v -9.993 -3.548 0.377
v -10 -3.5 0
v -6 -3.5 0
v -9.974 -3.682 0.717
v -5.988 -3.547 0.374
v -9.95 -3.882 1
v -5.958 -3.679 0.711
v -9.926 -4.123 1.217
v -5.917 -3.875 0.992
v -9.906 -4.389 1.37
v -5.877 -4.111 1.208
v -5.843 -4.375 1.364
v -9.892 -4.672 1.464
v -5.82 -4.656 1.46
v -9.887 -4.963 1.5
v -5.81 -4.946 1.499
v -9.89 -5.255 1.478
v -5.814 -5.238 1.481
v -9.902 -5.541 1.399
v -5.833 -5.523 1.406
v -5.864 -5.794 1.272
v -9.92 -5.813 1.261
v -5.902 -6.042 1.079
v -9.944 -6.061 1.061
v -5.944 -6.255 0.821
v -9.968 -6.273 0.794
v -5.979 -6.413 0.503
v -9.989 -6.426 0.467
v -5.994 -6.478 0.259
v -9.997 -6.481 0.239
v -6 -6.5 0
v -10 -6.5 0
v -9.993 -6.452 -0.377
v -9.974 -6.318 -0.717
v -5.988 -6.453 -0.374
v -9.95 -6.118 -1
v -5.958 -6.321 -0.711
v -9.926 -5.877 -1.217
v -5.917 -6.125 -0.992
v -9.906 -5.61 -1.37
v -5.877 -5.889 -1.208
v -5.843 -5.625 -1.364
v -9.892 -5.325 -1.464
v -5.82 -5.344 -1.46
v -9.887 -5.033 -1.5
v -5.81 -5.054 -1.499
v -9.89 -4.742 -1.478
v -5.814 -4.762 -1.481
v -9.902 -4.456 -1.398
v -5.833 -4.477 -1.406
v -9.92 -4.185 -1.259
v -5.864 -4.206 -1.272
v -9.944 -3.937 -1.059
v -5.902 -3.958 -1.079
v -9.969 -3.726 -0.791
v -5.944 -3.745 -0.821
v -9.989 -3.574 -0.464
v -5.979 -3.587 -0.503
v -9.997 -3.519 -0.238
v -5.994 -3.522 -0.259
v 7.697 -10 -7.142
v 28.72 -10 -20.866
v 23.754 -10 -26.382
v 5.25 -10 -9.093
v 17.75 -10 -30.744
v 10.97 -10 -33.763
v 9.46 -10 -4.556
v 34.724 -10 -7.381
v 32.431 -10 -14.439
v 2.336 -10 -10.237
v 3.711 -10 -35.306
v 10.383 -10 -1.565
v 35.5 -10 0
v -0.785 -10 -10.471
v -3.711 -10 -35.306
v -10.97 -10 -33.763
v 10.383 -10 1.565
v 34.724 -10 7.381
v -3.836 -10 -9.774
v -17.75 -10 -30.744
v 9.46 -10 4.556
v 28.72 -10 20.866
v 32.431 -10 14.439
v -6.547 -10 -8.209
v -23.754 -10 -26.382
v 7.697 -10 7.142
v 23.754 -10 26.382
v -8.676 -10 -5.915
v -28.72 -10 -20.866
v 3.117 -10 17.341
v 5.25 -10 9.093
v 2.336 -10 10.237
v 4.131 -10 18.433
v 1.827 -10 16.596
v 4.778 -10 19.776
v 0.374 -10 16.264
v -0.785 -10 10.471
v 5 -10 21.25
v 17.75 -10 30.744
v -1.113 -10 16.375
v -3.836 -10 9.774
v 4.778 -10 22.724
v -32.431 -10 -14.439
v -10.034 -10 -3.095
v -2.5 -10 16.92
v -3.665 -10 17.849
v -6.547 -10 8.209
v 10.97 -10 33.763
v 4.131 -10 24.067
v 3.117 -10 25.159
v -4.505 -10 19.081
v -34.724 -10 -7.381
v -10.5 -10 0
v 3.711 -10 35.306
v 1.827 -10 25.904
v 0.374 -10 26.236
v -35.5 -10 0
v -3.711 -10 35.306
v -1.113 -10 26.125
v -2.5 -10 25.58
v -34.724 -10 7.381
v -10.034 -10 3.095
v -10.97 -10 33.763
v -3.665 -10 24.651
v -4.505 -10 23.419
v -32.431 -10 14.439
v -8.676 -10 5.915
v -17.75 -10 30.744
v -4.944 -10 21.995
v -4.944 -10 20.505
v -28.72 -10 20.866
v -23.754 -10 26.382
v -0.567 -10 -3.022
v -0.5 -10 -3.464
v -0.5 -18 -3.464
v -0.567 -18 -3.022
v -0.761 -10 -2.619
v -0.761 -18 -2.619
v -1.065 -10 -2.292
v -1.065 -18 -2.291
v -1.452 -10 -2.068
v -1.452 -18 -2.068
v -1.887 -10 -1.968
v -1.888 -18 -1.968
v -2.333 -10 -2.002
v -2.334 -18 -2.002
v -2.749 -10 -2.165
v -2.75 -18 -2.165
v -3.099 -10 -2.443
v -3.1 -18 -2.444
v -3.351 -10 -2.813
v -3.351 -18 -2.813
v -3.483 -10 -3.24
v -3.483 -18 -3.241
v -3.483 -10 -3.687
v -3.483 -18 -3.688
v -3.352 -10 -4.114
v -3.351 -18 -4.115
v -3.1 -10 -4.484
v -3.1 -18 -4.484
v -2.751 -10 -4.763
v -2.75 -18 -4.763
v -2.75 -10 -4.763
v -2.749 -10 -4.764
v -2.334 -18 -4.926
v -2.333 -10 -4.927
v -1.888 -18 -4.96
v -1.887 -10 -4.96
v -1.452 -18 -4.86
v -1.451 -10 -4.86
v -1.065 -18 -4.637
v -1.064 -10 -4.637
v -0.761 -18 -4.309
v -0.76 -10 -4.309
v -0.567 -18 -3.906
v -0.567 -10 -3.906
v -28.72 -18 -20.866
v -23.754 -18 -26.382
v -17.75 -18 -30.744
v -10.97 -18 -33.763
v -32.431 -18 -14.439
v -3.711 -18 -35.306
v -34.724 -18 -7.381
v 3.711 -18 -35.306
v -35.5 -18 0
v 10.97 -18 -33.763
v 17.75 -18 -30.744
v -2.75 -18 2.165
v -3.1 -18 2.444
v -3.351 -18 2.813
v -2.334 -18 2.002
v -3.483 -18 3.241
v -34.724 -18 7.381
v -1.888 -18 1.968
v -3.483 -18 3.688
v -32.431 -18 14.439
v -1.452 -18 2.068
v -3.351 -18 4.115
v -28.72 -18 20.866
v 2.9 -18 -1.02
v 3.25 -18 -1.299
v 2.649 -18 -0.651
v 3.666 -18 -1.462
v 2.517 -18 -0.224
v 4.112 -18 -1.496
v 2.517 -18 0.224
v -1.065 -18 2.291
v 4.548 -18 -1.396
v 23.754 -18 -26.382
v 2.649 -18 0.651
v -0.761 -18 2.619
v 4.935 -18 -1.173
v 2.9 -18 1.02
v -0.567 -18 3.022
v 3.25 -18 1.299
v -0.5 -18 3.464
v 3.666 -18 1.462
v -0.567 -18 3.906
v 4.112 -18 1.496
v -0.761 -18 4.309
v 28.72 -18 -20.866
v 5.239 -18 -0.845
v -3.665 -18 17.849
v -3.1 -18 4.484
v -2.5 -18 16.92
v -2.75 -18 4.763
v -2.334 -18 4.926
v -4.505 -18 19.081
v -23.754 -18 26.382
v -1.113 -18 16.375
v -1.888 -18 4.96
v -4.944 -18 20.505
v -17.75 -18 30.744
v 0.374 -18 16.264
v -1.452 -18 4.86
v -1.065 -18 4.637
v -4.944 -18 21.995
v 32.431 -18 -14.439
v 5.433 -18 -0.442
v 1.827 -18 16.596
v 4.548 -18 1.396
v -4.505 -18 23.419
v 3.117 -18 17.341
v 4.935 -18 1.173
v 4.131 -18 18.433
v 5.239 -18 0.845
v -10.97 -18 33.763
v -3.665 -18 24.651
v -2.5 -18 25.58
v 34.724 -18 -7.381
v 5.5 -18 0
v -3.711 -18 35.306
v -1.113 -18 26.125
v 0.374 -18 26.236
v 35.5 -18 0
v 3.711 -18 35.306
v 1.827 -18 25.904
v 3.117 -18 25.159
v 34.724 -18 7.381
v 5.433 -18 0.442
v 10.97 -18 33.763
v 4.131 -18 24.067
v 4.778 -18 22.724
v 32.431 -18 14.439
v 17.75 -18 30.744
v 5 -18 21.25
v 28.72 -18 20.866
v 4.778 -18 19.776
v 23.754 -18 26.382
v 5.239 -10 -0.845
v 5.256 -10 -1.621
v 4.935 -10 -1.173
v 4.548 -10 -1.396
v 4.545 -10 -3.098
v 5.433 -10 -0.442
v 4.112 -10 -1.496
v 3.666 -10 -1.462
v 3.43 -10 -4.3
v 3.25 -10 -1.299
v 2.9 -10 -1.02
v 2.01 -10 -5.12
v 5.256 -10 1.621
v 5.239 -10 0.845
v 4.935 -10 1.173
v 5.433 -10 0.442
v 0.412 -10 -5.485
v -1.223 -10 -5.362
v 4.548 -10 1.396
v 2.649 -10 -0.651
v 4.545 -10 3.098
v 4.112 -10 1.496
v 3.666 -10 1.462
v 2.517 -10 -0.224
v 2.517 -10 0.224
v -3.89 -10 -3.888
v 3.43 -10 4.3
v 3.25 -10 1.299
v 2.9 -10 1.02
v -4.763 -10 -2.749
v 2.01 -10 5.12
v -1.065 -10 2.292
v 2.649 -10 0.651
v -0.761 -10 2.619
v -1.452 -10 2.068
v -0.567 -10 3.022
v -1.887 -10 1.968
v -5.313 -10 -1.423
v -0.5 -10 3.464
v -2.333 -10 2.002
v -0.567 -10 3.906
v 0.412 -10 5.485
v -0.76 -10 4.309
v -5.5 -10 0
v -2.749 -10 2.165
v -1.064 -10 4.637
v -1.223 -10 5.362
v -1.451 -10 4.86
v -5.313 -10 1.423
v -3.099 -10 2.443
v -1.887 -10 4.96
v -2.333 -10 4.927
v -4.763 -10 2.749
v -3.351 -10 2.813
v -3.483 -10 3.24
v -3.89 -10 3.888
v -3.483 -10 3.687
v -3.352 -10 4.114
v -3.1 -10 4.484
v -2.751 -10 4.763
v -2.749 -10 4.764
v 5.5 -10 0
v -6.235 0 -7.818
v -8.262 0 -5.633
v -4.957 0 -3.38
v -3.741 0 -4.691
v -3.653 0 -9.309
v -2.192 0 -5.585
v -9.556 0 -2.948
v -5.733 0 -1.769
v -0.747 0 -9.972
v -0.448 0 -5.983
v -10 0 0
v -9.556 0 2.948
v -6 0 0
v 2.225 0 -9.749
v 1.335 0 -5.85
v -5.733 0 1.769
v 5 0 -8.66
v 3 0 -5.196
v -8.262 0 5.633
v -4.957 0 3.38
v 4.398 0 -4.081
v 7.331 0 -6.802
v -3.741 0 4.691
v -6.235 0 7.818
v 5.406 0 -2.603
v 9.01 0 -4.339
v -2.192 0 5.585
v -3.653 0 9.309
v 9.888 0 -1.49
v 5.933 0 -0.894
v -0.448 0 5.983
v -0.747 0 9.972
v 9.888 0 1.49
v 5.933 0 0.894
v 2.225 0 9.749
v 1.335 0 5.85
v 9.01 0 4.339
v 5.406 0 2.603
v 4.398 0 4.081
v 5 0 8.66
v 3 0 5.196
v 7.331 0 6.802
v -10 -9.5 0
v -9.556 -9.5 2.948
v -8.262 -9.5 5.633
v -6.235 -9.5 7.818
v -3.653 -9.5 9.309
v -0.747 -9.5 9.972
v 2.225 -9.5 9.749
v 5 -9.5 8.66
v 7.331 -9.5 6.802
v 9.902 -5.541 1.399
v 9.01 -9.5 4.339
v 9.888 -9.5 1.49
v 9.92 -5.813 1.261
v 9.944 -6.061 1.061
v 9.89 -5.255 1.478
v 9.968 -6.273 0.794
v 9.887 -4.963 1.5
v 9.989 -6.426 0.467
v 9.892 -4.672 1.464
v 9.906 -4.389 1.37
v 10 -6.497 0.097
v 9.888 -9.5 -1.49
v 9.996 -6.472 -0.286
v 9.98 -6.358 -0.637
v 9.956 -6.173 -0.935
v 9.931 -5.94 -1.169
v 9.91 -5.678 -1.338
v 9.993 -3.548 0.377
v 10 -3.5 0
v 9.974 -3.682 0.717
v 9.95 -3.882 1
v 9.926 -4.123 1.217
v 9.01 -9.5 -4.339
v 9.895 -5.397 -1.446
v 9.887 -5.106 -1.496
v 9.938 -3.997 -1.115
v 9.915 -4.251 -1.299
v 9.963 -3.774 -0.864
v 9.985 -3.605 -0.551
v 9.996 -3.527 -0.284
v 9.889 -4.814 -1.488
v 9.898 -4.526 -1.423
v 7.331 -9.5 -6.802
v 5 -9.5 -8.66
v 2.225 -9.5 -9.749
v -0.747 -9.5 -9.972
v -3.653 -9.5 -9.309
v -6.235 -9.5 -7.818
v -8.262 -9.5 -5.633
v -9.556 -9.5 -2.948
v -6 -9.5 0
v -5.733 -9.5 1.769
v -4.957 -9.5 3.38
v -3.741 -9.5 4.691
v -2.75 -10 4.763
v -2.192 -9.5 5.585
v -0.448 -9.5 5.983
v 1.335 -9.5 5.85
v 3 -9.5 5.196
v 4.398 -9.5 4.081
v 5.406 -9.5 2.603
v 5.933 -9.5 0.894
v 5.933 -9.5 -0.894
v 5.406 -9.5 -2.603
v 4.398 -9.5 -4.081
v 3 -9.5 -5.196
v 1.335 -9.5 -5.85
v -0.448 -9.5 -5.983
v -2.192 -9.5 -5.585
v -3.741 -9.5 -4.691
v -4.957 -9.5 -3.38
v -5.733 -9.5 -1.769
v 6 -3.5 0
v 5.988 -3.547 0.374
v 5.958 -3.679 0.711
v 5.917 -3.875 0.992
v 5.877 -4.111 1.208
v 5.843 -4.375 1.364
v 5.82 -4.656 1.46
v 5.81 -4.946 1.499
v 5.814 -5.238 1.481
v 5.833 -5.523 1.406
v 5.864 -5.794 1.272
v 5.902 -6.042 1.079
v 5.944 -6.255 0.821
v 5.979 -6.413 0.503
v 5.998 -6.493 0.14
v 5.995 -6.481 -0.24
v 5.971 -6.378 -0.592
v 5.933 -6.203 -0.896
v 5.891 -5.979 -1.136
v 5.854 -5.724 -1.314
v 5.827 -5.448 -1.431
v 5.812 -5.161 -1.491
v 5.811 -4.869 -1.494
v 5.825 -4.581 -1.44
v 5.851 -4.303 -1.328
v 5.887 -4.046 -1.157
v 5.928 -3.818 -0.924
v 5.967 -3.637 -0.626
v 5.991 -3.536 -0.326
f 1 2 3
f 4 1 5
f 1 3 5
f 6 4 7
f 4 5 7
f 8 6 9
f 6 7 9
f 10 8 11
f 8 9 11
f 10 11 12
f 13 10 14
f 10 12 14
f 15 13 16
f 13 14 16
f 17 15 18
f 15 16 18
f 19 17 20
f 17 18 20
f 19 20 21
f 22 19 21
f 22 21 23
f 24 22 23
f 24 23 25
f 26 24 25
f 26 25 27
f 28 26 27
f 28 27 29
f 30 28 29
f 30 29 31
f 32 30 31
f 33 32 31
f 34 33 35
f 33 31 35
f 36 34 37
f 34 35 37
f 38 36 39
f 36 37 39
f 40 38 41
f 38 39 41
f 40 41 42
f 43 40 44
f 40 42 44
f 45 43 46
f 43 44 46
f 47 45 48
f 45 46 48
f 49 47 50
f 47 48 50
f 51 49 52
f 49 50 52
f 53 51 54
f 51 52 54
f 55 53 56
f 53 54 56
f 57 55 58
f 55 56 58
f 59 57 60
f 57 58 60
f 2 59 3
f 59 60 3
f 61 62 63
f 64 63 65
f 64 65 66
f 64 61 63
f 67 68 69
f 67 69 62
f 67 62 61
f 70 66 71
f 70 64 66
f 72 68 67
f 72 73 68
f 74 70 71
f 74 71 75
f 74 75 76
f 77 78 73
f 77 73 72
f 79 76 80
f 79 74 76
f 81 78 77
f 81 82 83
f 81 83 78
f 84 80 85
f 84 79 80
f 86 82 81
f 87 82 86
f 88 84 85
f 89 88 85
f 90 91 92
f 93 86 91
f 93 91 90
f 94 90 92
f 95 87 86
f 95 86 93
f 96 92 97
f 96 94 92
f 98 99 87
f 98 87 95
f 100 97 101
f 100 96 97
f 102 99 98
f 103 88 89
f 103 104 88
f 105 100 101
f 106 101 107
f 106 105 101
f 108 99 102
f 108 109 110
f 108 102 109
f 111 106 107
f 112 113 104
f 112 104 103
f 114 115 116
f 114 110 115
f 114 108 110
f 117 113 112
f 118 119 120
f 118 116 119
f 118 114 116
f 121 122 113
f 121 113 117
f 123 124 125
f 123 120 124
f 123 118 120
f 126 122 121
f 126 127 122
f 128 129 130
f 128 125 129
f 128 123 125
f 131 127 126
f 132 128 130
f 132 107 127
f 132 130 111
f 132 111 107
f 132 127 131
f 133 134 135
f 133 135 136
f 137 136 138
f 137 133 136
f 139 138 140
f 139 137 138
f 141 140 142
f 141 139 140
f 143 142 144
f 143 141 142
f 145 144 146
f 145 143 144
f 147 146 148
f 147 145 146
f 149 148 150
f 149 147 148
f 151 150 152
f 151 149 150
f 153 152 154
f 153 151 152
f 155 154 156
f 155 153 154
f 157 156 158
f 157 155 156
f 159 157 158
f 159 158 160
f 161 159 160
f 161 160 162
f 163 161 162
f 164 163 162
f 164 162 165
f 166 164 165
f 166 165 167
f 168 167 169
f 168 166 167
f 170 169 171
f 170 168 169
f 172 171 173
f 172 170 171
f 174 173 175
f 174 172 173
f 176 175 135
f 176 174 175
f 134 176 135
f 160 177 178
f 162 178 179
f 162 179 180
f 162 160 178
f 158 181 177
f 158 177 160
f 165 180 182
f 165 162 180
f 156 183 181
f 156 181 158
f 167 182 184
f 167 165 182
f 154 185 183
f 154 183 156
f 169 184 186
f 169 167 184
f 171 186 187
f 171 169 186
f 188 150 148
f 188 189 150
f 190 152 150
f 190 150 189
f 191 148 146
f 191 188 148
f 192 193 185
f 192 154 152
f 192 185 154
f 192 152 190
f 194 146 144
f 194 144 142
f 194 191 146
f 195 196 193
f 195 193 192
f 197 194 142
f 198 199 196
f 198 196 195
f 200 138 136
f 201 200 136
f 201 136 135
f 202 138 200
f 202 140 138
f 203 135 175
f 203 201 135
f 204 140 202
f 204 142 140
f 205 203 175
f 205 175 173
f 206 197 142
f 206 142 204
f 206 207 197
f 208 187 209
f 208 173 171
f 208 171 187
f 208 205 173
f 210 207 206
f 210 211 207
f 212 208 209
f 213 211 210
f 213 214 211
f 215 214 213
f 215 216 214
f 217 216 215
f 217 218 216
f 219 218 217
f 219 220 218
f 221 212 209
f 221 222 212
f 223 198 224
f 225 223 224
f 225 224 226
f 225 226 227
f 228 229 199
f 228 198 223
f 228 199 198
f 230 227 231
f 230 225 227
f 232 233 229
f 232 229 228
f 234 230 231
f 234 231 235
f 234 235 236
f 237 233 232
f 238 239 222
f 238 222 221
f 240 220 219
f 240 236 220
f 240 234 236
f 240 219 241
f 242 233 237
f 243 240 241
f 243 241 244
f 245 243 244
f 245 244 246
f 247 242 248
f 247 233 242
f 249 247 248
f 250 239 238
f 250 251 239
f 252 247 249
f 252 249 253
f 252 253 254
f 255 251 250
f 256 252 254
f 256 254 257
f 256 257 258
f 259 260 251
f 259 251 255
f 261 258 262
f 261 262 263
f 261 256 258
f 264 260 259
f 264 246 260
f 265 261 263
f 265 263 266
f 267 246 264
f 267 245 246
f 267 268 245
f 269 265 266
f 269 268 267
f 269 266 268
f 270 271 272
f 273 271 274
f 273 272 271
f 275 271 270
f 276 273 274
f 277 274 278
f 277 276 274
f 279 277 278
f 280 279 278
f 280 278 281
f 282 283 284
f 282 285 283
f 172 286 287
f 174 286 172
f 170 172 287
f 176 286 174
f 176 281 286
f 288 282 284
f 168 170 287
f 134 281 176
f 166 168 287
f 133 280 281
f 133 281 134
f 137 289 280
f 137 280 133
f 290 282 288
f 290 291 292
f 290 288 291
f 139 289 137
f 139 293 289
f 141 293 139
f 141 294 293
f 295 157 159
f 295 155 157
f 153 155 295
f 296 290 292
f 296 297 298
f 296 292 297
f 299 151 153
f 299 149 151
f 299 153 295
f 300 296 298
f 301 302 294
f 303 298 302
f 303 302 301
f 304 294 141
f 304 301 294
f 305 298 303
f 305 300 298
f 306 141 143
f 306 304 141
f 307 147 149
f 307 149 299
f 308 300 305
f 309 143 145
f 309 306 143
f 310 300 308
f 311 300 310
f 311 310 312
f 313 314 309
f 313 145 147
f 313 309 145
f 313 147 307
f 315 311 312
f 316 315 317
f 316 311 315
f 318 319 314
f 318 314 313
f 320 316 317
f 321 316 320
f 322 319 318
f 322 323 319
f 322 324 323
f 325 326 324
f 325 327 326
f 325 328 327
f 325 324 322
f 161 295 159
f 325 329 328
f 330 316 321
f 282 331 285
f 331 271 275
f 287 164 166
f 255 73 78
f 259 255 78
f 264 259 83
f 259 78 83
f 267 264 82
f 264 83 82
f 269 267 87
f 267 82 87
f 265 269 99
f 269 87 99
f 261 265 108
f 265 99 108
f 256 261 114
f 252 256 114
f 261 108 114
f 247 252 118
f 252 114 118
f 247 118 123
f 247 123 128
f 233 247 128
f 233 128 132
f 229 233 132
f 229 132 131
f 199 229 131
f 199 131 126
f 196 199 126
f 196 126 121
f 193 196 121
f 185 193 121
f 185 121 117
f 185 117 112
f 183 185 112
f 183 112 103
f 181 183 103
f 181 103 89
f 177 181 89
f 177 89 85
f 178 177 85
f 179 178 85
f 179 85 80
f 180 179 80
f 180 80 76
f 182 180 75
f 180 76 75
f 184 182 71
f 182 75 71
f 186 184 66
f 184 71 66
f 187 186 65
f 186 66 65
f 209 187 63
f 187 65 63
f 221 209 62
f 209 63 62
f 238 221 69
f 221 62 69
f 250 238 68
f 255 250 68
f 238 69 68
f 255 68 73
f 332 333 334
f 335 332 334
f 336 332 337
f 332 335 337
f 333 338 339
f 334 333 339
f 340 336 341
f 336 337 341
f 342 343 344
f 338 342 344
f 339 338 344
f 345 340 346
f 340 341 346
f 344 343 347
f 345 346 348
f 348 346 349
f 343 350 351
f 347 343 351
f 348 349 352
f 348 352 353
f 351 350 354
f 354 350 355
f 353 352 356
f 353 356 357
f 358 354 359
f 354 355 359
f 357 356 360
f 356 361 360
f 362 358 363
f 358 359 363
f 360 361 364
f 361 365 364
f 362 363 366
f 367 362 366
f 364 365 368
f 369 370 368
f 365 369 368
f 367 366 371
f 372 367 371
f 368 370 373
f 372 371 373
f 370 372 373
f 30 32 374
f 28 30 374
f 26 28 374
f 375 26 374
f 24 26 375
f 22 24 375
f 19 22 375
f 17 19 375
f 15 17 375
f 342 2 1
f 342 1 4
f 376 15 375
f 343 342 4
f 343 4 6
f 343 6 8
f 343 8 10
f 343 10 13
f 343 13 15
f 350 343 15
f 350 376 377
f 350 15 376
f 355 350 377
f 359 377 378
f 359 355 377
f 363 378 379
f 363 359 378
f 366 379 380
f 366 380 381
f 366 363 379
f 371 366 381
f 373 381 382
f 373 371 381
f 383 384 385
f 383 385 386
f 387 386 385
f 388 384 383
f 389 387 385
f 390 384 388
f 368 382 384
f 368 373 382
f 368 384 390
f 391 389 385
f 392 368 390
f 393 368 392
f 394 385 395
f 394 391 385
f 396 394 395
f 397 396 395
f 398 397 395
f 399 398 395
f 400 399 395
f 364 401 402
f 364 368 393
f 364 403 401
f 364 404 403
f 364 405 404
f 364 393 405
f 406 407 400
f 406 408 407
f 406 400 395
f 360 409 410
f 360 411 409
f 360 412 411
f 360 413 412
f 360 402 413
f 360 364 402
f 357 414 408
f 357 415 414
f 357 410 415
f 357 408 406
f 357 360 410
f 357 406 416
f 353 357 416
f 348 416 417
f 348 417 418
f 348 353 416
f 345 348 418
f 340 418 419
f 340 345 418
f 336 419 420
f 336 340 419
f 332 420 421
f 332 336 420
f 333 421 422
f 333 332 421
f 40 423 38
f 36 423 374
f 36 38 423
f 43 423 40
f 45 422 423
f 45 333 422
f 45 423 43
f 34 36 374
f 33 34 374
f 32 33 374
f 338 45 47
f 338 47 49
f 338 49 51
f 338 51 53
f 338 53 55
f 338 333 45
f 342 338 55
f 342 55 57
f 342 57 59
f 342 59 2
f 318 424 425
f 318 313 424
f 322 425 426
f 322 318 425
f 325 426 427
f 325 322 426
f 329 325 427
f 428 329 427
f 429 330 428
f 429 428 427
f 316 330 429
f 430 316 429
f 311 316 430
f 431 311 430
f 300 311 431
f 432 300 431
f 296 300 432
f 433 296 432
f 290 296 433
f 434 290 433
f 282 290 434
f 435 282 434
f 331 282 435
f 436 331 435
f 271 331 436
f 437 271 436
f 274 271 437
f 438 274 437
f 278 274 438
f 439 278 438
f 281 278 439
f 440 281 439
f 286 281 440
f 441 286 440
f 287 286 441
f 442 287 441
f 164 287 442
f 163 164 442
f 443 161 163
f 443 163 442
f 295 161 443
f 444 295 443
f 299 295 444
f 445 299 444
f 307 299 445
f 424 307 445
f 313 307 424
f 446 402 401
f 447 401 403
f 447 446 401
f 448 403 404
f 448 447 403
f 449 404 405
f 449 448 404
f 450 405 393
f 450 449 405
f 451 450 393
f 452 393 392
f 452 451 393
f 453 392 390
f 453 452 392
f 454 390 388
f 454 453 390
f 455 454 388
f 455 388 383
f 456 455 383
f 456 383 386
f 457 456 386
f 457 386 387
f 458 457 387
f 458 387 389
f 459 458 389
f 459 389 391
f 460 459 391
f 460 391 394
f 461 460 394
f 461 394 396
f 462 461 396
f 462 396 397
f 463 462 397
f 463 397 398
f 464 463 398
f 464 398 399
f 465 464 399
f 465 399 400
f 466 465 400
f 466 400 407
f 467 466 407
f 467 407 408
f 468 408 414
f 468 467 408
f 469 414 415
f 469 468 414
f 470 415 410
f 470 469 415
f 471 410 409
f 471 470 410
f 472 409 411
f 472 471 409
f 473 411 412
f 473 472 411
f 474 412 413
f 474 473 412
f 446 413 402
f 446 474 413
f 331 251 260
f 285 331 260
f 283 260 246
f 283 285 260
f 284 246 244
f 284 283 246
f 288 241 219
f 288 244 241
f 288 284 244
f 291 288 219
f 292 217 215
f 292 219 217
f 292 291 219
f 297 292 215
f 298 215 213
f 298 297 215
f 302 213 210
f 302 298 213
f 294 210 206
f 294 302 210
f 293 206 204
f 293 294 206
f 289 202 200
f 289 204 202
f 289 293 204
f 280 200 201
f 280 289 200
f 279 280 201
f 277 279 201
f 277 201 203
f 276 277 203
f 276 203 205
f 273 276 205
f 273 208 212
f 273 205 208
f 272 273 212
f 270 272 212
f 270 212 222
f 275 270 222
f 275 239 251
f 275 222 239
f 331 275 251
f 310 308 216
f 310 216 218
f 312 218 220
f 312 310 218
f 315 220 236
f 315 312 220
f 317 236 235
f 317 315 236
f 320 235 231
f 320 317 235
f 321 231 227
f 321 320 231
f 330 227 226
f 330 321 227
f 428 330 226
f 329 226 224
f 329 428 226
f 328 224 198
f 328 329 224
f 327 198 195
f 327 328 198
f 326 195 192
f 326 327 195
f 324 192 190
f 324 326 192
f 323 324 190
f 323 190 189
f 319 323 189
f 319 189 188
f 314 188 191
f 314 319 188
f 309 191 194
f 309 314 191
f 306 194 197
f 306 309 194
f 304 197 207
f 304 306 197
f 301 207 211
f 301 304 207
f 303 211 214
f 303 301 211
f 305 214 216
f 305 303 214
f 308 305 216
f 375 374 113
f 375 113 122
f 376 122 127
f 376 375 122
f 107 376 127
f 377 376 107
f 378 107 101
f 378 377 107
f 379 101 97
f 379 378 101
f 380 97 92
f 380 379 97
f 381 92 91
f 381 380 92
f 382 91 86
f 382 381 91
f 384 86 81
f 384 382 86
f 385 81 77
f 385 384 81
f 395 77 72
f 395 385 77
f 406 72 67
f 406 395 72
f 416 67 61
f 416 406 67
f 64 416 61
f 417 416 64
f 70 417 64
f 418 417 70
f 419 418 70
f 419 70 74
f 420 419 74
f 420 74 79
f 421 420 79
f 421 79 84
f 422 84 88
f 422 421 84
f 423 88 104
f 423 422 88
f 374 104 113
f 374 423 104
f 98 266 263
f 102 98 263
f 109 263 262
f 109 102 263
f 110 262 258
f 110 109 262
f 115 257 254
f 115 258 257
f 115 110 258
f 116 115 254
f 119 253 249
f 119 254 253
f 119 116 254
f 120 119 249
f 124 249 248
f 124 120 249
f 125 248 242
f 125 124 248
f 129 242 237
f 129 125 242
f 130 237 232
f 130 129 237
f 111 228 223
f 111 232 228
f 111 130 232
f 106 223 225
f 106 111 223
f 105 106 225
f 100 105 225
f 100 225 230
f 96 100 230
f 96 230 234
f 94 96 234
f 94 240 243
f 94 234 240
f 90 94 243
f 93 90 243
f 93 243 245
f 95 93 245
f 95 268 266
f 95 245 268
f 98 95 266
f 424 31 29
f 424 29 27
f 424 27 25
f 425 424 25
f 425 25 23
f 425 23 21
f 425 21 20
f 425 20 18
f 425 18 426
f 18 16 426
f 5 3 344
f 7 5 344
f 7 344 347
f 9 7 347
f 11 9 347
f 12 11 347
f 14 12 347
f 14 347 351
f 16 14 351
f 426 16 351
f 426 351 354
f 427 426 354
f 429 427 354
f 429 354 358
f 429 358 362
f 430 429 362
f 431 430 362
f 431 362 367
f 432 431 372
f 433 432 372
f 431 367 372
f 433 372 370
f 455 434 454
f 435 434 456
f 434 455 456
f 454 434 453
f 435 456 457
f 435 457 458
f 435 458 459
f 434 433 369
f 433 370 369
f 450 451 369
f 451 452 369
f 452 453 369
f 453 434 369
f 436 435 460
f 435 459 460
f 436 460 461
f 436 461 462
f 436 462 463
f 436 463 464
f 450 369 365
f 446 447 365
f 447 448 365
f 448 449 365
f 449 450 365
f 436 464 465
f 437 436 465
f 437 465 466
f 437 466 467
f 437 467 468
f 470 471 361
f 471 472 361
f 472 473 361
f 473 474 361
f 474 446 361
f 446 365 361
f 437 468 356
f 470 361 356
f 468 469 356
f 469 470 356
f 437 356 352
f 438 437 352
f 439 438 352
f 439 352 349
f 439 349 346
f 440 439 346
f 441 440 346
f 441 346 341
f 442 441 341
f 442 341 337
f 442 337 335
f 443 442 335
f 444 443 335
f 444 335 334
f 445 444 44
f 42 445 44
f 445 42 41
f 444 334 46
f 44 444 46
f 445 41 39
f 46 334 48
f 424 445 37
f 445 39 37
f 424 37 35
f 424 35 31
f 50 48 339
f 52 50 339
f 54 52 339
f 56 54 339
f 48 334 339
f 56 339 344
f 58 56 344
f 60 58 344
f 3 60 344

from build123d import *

# Parameters (mm, degrees)
F0_R          = 35.5
F1_DEPTH      = 18
F2_R          = 65
F2_R_2        = 10
F3_DEPTH      = 10
F4_R          = 6
F5_DEPTH      = 10
F6_SIZE       = 0.5
F7_R          = 1.5
F8_DEPTH      = 25
F8_DEPTH_BACK = 25
F9_R          = 5
F10_DEPTH     = 25
F11_SIZE      = 0.5
F12_R         = 1.5
F13_DEPTH     = 20


with BuildPart() as f1:
    # F0 (on Front) → F1 (new body)
    with BuildSketch(Plane.XZ):
        Circle(F0_R)
    extrude(amount=F1_DEPTH)

    # F2 (on face) → F3 (cut)
    with BuildSketch(Plane(origin=(0, 0, 0), x_dir=(-1, 0, 0), z_dir=(0, 1, 0))):
        Circle(F2_R)
        Circle(F2_R_2, mode=Mode.SUBTRACT)
    extrude(amount=-F3_DEPTH, mode=Mode.SUBTRACT)

    # F4 (on face) → F5 (cut)
    with BuildSketch(Plane(origin=(0, 0, 0), x_dir=(-1, 0, 0), z_dir=(0, 1, 0))):
        Circle(F4_R)
    extrude(amount=-F5_DEPTH, mode=Mode.SUBTRACT)

    # F6
    f6_edges = [f1.edges().sort_by_distance(p)[0] for p in [
        (10, -10, 0),
    ]]
    chamfer(f6_edges, length=F6_SIZE)

    # F7 (on Right) → F8 (cut, two sides)
    with BuildSketch(Plane.YZ) as f8_sk:
        with Locations((-5, 0)):
            Circle(F7_R)
    extrude(amount=F8_DEPTH, mode=Mode.SUBTRACT)
    extrude(f8_sk.sketch, amount=-F8_DEPTH_BACK, mode=Mode.SUBTRACT)

    # F9 (on Front) → F10 (cut)
    with BuildSketch(Plane.XZ):
        with Locations((0, 21.25)):
            Circle(F9_R)
    extrude(amount=F10_DEPTH, mode=Mode.SUBTRACT)

    # F11
    f11_edges = [f1.edges().sort_by_distance(p)[0] for p in [
        (6, -10, 0),
    ]]
    chamfer(f11_edges, length=F11_SIZE)

    # F12 (on Front) → F13 (cut)
    with BuildSketch(Plane.XZ):
        with Locations((-2, 3.464102)):
            Circle(F12_R)
        with Locations((-2, -3.464102)):
            Circle(F12_R)
        with Locations((4, 0)):
            Circle(F12_R)
    extrude(amount=F13_DEPTH, mode=Mode.SUBTRACT)


solid = f1.part
